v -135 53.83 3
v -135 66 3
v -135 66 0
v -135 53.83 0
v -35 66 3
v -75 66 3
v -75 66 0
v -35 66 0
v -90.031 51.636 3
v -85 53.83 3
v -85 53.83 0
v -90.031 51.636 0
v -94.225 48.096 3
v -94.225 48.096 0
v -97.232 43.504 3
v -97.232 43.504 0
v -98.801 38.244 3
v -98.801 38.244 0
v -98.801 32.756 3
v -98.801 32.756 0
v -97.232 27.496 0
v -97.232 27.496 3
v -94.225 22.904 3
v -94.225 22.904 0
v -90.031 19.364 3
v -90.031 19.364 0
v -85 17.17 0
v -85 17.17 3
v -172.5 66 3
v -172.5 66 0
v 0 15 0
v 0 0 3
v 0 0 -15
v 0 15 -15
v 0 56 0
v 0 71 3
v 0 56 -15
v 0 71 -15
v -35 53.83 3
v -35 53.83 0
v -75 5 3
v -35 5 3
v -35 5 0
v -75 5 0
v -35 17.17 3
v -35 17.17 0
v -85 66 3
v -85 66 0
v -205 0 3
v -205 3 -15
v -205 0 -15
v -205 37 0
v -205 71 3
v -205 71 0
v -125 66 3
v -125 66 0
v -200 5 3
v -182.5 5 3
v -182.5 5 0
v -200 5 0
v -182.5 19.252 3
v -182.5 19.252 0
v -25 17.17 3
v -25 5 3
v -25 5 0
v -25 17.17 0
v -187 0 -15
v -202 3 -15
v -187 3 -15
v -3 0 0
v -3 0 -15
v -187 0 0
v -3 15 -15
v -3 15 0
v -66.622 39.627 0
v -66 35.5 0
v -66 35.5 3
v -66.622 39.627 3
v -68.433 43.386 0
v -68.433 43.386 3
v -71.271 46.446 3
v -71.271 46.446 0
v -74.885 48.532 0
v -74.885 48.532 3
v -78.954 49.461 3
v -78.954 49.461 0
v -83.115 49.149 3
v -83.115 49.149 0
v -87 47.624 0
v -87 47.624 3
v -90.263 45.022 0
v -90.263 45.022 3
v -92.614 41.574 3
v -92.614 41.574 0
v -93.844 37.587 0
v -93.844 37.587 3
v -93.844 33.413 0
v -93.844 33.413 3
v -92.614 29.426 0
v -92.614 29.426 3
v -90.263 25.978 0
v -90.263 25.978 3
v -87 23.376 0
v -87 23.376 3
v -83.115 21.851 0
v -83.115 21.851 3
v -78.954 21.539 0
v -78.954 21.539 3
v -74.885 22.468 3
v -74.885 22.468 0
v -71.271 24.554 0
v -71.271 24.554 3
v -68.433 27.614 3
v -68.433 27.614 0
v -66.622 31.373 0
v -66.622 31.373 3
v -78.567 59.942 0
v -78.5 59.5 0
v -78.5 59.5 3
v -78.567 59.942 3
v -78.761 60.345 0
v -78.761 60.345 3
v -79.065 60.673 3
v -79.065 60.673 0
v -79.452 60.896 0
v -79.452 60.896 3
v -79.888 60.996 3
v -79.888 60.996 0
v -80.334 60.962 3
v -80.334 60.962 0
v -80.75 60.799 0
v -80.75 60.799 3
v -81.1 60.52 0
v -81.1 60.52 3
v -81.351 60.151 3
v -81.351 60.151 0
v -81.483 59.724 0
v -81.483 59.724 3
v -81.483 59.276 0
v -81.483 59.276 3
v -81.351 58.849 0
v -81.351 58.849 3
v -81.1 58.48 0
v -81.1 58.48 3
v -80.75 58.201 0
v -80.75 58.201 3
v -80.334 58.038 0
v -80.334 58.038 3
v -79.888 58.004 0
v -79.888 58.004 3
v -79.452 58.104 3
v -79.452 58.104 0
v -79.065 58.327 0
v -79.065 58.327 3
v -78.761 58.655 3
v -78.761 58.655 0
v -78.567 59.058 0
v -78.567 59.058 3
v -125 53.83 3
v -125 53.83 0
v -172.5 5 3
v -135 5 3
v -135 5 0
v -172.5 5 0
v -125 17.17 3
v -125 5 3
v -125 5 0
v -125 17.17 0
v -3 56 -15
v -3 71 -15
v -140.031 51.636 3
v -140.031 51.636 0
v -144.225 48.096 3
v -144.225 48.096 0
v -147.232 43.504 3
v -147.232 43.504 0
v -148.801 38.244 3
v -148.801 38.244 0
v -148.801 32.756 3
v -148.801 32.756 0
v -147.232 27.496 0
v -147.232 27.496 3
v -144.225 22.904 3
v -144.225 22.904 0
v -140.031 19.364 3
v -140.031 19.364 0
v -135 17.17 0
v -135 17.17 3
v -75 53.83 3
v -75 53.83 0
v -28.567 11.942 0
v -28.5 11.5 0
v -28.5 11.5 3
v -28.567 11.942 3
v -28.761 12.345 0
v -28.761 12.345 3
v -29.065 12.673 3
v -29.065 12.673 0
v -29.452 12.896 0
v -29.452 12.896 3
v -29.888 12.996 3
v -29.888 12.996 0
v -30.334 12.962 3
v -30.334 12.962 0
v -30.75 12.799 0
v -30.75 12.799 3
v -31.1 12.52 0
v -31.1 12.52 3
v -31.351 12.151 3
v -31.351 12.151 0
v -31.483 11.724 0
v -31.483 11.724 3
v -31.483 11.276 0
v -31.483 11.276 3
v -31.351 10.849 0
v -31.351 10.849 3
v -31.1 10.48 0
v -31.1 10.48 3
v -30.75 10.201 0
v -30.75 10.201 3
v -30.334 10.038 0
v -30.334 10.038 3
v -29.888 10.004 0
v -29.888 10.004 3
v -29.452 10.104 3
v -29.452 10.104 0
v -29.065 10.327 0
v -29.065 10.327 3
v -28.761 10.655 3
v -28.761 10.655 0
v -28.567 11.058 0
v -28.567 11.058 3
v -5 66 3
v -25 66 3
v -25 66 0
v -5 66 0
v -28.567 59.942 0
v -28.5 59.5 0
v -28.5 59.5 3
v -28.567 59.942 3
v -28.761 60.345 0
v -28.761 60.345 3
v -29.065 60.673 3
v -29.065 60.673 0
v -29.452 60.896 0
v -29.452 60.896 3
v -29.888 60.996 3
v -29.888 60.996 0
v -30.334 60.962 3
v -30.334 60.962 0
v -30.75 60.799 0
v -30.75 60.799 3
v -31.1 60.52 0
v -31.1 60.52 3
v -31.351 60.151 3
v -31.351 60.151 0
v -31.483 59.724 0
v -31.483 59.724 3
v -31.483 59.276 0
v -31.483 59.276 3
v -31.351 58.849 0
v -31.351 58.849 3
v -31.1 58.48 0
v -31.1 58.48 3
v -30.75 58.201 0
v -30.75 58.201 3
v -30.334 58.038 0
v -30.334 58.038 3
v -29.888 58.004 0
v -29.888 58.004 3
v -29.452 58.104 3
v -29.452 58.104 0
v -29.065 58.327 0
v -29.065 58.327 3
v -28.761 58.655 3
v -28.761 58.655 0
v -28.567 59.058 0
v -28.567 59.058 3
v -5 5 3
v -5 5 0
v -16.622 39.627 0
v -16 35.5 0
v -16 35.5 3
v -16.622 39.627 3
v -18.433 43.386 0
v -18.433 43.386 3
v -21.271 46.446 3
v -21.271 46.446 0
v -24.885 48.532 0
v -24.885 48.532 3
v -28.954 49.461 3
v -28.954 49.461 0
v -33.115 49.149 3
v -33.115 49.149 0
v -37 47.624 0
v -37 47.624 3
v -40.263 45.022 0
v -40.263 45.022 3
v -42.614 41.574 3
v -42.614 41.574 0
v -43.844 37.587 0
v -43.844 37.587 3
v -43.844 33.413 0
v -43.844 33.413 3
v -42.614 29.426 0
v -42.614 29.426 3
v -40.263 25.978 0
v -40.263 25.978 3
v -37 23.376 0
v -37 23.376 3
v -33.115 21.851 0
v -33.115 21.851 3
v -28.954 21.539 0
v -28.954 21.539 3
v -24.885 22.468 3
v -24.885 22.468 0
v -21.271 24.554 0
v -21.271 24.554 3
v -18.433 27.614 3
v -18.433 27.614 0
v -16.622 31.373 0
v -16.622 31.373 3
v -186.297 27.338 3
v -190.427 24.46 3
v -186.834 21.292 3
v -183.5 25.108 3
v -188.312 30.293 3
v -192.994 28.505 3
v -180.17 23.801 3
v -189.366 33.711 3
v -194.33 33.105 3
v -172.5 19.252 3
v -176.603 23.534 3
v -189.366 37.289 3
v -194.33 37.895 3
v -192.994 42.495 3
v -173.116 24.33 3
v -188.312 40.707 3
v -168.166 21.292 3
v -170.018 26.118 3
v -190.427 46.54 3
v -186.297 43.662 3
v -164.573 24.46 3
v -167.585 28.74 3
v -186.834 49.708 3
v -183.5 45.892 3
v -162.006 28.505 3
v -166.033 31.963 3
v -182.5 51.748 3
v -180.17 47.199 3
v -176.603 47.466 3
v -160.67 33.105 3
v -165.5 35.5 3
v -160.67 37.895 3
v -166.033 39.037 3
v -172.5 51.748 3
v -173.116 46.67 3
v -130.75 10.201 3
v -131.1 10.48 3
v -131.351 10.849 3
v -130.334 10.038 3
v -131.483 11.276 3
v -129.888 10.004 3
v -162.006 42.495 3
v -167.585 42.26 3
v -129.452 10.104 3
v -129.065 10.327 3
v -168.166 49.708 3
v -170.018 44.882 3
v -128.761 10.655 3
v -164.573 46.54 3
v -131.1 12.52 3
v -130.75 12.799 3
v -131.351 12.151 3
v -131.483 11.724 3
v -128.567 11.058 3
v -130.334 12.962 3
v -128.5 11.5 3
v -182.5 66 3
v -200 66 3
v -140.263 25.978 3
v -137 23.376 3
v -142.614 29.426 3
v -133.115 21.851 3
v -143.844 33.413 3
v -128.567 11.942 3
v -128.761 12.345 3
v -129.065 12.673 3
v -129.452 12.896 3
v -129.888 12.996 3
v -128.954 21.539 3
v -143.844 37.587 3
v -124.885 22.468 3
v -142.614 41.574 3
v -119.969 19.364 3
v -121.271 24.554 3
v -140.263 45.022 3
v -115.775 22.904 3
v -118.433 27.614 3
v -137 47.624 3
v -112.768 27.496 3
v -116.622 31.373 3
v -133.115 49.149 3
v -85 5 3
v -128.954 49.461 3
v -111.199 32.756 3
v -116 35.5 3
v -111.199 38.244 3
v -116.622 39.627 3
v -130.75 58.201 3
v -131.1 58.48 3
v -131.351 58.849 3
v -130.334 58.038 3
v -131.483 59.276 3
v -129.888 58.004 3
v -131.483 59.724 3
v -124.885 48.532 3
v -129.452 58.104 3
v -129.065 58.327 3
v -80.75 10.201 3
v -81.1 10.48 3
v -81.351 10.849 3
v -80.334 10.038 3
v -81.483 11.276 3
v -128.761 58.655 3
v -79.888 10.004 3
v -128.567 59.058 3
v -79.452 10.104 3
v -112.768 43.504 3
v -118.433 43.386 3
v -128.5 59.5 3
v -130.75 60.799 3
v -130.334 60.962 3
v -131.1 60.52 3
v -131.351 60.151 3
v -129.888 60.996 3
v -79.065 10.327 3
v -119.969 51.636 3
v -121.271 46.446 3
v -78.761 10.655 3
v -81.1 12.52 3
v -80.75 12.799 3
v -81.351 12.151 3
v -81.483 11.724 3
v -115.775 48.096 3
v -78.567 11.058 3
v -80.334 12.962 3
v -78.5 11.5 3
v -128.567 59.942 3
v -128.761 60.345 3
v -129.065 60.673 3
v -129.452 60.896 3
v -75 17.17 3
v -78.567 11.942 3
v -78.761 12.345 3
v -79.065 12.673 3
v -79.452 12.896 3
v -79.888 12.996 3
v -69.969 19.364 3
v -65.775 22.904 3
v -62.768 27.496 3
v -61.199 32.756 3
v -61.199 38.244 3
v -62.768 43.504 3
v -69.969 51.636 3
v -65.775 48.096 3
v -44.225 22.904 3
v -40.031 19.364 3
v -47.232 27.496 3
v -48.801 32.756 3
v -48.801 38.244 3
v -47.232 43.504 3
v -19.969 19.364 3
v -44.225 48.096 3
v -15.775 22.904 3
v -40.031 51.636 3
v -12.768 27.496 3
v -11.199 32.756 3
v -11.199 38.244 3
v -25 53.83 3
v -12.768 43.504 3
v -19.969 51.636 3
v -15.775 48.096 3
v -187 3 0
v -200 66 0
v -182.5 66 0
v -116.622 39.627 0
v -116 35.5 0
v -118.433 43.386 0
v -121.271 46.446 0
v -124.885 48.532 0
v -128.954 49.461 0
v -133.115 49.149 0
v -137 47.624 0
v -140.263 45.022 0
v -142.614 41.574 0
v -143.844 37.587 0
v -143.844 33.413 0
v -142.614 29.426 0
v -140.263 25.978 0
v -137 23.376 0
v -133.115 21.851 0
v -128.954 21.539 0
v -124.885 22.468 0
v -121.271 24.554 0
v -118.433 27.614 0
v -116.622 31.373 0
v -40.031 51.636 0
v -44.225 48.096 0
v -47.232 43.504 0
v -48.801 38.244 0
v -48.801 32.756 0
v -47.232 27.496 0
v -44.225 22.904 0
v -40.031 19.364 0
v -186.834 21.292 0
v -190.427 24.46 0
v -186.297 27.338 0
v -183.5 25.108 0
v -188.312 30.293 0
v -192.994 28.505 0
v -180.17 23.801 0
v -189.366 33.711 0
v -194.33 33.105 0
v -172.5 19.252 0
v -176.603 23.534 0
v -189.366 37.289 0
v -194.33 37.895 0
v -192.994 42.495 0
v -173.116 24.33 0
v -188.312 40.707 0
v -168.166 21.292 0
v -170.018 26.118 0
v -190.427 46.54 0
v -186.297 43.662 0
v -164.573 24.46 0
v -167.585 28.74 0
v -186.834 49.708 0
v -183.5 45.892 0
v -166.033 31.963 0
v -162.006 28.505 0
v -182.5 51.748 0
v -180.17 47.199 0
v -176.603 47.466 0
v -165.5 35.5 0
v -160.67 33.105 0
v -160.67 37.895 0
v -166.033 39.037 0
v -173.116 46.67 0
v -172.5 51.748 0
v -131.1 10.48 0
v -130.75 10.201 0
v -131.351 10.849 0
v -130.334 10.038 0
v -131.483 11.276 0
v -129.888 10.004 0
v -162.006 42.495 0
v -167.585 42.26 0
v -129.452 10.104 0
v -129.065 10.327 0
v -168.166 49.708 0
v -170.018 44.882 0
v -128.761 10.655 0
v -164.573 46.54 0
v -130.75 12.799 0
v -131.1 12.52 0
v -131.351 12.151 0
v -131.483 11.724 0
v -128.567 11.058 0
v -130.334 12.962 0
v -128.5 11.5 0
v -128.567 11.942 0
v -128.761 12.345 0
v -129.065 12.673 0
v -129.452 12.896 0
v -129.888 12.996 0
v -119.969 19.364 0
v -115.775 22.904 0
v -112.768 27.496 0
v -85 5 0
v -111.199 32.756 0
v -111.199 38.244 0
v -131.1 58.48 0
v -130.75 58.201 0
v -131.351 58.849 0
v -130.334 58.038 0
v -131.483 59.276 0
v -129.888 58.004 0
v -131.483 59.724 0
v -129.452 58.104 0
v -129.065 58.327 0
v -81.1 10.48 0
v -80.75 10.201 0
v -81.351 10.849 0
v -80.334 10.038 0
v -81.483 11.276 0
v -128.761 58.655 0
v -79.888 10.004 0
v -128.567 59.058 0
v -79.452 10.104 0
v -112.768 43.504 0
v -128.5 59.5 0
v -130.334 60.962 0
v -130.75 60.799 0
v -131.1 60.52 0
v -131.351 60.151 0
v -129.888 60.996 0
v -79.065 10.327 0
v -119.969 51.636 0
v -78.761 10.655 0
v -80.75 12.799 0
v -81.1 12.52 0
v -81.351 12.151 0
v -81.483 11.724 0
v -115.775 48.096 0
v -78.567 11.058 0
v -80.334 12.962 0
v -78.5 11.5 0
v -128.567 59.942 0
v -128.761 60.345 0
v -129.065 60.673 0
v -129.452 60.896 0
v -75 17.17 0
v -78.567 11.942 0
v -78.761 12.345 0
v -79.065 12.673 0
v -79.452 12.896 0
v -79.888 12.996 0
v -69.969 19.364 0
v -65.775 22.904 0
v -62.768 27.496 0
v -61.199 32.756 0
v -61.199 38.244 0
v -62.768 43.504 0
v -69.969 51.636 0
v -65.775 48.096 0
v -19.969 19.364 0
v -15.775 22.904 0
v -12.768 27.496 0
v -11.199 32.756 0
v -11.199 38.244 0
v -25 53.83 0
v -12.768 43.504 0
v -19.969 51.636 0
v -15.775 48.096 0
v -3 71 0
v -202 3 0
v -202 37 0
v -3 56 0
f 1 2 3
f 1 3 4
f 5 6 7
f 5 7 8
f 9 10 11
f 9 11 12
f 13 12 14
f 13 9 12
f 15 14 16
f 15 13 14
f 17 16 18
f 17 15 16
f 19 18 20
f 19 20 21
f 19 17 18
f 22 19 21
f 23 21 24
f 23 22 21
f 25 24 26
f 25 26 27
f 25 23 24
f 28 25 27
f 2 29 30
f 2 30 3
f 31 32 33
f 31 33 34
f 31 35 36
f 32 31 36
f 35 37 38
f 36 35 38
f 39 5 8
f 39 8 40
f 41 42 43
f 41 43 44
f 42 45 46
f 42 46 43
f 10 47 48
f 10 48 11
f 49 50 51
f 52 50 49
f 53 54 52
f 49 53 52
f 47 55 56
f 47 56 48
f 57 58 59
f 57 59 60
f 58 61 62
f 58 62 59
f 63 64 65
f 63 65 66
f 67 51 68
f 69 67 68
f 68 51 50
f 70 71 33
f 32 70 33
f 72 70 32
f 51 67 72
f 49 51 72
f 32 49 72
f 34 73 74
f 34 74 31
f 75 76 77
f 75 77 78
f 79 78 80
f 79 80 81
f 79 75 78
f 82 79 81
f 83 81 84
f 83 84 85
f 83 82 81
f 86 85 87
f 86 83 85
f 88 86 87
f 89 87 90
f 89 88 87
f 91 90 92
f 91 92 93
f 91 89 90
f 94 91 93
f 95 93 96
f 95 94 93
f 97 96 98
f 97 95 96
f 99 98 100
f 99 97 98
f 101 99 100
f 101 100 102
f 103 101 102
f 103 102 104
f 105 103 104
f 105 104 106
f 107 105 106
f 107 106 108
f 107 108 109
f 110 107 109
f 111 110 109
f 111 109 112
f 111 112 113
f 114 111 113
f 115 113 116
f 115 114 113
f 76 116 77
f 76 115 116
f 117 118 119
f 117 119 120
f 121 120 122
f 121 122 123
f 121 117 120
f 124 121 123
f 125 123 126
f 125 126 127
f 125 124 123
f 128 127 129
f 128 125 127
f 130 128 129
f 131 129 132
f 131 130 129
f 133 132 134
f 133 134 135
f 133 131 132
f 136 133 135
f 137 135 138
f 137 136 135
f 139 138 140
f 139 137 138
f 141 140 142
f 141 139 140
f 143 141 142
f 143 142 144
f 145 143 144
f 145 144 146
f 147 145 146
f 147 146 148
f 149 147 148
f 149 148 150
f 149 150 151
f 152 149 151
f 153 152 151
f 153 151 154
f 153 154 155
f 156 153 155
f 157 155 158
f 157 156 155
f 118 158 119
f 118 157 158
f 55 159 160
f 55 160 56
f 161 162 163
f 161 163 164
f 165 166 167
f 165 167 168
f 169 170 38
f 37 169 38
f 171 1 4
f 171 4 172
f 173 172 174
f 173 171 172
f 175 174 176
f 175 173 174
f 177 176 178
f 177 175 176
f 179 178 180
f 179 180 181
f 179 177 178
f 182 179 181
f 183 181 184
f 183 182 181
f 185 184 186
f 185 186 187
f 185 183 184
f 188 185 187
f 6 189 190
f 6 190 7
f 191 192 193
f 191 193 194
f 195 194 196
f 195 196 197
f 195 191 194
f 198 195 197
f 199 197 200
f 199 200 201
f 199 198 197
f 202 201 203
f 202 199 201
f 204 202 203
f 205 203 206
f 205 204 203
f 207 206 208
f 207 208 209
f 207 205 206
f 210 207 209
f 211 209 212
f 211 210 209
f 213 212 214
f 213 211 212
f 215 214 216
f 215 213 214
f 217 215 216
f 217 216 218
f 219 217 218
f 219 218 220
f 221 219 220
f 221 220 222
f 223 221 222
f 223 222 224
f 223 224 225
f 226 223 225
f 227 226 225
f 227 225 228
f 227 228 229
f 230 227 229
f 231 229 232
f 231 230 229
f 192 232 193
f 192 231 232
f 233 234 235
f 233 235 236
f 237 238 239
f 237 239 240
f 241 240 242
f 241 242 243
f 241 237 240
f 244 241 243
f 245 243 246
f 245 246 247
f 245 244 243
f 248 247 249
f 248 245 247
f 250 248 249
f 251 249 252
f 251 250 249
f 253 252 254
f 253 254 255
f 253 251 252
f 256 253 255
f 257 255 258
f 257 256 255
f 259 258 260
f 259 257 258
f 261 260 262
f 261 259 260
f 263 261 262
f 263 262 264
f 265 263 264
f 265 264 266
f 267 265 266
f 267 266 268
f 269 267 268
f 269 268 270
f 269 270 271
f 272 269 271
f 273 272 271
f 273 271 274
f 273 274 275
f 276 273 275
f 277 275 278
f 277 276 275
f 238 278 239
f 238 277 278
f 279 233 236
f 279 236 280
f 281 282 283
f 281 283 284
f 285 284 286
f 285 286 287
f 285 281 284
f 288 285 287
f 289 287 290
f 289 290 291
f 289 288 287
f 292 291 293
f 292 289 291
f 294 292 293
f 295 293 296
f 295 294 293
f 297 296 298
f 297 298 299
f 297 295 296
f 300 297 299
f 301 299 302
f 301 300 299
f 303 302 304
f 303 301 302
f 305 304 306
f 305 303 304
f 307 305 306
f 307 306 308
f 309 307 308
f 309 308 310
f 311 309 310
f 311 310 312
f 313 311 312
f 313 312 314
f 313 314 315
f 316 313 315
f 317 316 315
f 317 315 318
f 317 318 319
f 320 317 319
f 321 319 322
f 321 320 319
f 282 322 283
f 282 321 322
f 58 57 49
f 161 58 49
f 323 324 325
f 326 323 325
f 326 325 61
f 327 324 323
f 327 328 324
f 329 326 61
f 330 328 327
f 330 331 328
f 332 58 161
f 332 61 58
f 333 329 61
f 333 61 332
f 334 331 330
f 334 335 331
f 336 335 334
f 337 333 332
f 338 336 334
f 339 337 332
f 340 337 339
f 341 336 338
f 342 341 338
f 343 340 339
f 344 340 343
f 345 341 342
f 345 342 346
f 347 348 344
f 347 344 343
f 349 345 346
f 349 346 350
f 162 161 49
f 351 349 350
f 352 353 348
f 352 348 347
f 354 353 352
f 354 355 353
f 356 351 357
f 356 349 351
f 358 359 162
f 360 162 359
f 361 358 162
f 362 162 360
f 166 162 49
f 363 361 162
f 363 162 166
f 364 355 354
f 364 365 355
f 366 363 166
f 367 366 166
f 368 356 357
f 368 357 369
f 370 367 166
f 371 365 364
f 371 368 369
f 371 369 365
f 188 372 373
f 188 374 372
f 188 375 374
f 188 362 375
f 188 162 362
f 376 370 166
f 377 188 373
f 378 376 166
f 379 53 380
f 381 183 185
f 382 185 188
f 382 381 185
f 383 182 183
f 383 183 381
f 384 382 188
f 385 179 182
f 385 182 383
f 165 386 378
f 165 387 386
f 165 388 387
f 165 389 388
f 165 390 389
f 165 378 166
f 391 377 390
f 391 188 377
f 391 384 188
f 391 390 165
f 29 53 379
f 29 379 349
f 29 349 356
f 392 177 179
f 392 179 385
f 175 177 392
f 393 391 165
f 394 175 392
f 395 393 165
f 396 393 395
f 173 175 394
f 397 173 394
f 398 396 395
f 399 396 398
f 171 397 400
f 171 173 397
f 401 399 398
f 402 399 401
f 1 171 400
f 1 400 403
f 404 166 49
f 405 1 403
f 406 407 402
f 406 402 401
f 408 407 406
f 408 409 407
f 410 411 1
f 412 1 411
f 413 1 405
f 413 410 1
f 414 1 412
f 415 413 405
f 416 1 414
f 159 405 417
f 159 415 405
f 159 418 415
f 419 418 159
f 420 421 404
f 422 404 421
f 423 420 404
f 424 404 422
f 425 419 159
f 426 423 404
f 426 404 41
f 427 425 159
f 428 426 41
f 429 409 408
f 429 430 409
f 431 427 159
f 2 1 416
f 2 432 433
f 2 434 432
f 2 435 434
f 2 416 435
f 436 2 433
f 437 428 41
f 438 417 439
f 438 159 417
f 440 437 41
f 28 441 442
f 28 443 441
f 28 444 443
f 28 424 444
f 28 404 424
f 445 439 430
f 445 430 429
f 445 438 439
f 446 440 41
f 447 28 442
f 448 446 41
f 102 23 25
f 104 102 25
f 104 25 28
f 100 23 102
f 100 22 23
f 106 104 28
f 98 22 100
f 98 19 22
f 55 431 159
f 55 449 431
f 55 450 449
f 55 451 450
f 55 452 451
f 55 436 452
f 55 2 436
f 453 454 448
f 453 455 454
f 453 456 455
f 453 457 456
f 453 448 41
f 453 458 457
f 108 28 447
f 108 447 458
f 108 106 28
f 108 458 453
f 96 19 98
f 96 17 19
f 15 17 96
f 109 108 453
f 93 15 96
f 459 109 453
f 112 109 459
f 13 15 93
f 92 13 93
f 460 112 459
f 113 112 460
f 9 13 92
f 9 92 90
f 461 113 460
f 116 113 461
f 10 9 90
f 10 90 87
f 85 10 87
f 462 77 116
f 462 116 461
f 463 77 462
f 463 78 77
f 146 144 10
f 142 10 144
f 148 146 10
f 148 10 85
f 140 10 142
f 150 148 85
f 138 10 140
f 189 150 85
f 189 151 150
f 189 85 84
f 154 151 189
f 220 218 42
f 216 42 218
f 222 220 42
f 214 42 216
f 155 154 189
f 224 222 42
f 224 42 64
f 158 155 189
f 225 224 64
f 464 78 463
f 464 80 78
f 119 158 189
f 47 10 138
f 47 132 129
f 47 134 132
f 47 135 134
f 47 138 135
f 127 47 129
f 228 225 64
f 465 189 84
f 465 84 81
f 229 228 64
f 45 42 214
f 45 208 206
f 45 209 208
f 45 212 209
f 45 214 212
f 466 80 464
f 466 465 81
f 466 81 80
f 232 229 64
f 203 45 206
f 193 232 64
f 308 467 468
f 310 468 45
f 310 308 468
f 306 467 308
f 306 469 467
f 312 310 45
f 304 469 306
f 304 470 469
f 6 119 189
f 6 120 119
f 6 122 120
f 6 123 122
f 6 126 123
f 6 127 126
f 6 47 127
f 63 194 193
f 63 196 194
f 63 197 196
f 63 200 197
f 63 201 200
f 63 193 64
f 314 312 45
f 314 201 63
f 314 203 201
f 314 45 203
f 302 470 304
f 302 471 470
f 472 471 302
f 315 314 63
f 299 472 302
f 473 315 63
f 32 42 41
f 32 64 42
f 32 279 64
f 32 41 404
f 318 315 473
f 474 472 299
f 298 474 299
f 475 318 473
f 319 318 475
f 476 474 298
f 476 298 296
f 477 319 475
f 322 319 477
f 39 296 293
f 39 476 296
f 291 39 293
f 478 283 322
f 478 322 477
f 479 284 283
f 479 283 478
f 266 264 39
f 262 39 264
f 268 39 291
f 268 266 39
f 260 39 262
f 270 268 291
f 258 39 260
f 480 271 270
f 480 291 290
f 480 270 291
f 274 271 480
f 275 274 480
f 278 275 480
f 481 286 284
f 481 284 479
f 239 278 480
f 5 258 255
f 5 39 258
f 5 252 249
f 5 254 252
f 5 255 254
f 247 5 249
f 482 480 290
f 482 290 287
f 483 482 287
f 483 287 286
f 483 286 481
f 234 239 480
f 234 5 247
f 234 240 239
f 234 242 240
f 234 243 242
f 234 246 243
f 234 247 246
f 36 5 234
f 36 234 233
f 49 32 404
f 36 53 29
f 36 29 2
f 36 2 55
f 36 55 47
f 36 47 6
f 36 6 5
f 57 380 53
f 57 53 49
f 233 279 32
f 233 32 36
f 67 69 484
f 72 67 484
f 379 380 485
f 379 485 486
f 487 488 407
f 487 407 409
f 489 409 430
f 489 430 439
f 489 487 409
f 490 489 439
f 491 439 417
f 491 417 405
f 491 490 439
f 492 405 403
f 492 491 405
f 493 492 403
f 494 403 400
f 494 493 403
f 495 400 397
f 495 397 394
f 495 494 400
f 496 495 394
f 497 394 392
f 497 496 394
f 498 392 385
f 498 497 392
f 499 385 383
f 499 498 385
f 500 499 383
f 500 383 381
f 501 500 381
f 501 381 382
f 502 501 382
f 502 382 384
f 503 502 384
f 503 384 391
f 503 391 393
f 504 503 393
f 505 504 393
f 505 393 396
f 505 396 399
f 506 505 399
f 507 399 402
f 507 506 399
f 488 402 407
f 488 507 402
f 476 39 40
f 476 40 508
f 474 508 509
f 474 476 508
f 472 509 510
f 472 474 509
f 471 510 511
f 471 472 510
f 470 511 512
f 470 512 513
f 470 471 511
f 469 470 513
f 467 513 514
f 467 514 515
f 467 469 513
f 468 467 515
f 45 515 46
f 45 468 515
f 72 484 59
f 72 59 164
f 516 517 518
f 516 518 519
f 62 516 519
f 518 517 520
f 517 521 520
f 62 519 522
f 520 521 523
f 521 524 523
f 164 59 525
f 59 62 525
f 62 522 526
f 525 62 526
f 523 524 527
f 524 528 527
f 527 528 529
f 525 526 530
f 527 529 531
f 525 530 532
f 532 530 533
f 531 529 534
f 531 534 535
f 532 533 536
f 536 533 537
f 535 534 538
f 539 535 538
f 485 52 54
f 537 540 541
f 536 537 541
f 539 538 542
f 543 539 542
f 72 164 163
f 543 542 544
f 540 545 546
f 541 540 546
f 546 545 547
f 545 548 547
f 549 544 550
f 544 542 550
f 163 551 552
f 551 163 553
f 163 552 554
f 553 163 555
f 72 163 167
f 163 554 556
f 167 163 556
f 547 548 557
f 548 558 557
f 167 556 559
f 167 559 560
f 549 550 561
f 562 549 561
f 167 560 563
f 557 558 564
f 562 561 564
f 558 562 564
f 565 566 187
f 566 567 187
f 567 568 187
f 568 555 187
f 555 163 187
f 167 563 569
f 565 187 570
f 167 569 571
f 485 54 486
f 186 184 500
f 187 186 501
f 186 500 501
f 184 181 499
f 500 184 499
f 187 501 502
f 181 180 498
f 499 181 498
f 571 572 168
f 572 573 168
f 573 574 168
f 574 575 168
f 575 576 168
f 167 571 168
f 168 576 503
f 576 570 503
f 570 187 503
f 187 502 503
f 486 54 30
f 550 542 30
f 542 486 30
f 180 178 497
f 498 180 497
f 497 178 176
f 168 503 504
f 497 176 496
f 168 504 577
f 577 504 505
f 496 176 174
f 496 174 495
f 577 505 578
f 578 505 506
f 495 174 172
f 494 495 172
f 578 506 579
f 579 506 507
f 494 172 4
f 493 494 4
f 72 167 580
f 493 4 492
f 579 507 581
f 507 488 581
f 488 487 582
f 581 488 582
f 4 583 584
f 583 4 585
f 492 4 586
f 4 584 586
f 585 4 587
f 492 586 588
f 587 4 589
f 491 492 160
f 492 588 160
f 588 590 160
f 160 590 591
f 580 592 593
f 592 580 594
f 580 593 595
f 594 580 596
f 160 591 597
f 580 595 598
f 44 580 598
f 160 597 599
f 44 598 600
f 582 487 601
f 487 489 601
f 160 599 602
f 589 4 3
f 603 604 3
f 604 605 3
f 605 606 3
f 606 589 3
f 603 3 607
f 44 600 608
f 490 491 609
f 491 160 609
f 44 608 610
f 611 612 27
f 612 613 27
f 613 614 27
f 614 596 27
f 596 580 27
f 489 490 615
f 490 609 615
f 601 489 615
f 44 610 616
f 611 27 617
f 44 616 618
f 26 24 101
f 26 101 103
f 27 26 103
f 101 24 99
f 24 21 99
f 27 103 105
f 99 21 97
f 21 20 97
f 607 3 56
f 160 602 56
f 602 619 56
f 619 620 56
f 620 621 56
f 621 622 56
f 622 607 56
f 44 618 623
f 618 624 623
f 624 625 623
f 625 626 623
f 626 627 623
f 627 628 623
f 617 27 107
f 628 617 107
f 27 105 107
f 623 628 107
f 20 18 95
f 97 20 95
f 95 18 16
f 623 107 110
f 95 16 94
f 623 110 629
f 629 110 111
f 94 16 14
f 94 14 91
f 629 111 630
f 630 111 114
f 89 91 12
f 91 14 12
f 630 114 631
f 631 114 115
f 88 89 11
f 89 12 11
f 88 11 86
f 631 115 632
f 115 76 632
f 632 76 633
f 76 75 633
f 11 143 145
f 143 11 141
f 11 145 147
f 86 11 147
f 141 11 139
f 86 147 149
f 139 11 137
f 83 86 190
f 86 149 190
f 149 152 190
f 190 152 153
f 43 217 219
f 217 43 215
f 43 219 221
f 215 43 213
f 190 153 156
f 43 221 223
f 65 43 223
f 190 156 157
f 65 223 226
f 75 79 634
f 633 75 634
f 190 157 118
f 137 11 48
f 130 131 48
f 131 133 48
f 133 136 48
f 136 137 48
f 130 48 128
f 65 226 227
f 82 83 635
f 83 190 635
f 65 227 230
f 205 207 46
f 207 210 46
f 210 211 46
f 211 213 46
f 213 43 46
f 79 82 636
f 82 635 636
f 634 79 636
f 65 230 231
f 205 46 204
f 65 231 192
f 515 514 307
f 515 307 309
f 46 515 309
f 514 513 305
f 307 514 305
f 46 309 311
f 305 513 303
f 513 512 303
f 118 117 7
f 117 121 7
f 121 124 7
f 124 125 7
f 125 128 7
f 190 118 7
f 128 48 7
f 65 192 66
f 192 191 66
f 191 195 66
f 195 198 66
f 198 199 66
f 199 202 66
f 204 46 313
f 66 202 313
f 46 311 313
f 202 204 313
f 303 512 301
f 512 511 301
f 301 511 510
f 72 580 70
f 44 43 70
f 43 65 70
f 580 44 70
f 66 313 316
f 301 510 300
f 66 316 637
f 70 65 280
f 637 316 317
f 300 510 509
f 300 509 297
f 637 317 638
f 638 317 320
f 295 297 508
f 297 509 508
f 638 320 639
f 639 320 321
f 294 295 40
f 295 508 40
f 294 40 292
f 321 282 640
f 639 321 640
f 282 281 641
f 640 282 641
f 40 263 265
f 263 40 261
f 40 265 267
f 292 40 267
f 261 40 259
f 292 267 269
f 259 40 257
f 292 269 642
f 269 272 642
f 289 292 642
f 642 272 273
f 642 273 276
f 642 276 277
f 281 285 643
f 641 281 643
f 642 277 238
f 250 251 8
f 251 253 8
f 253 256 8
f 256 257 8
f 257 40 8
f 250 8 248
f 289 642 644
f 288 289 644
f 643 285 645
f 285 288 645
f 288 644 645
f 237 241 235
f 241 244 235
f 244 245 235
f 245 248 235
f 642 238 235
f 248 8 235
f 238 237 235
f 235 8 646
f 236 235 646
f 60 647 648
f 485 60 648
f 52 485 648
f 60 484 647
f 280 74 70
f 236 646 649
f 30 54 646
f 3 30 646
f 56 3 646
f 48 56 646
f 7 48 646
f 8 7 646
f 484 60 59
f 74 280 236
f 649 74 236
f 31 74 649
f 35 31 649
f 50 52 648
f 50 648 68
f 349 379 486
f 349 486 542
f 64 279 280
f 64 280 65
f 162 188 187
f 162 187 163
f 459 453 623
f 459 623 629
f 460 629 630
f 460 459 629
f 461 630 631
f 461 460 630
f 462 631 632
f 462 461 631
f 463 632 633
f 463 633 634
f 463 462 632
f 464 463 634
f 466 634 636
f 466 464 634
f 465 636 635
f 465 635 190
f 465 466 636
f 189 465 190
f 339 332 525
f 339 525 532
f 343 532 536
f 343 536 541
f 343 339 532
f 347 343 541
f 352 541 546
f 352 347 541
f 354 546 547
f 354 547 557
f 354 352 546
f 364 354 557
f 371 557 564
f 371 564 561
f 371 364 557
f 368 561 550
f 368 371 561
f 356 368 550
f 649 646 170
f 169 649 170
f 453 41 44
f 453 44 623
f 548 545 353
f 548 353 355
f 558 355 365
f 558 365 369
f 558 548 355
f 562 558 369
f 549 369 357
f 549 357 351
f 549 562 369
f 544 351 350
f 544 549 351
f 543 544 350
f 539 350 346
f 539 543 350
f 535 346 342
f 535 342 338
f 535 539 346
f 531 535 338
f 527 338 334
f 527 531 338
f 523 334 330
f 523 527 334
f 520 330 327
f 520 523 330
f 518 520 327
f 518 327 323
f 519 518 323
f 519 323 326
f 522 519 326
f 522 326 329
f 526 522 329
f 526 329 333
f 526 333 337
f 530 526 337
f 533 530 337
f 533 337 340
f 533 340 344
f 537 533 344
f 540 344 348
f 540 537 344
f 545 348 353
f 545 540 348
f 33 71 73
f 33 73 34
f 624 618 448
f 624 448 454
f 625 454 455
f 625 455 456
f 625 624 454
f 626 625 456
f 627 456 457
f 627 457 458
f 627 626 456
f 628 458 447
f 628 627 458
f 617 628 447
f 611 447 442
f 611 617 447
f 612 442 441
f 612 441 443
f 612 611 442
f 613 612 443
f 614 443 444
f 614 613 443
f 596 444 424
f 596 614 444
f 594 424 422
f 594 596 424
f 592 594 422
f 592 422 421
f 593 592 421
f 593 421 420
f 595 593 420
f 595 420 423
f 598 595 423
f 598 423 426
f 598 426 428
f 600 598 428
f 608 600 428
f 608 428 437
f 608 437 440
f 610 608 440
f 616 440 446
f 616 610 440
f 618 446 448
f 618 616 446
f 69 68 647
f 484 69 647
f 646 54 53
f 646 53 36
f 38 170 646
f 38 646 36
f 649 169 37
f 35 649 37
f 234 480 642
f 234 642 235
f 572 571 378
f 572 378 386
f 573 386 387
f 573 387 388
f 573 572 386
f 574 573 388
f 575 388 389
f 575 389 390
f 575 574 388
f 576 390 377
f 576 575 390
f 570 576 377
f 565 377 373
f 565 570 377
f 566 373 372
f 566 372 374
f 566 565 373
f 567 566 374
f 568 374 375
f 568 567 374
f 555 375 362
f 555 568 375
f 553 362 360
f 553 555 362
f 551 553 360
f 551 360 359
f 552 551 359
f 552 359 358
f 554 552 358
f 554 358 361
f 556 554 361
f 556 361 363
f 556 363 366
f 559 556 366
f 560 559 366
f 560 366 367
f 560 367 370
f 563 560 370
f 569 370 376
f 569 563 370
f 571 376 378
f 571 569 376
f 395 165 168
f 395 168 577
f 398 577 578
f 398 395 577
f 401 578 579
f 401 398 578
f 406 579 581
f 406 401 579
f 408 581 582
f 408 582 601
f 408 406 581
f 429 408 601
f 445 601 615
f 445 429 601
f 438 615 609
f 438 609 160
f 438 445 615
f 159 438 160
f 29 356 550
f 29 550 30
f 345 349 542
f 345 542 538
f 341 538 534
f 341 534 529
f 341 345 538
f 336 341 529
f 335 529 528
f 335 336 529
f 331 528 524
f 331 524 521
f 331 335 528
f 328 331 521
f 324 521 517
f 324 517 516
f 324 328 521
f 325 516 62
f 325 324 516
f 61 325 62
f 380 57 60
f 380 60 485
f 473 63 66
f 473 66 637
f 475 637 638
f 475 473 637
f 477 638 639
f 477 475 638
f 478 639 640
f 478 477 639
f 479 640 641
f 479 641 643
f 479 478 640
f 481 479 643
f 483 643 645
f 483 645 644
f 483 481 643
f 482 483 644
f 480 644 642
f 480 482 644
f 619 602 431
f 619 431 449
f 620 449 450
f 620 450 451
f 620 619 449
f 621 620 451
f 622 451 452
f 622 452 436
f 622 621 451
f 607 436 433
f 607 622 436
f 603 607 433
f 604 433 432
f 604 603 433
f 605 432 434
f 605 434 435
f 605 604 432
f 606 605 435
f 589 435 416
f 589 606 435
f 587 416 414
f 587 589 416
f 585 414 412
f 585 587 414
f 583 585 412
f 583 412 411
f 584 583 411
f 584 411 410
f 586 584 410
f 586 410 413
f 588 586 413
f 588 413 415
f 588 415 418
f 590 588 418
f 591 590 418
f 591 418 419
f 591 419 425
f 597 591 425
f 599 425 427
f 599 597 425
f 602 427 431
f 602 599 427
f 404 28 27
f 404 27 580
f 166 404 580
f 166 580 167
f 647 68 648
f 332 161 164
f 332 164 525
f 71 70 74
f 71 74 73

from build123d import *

# Parameters (mm, degrees)
SKETCH1_W           = 205
SKETCH1_H           = 71
SKETCH1_R           = 14
SKETCH1_R_2         = 12
SKETCH1_R_3         = 1.5
BOSS_EXTRUDE1_DEPTH = 3
SKETCH2_W           = 3
SKETCH2_H           = 15
BOSS_EXTRUDE2_DEPTH = 15
BOSS_EXTRUDE3_START = -71
SKETCH2_2_W         = 3
SKETCH2_2_H         = 15
BOSS_EXTRUDE3_DEPTH = 15
SKETCH4_W           = 15
SKETCH4_H           = 3
BOSS_EXTRUDE4_DEPTH = 18
BOSS_EXTRUDE5_DEPTH = 3
CUT_EXTRUDE1_REACH  = 219.692


with BuildPart() as part:
    # Sketch1 → Boss-Extrude1 (new body)
    with BuildSketch(Plane.XY):
        with Locations((-102.5, 35.5)):
            Rectangle(SKETCH1_W, SKETCH1_H)
        with Locations((-30, 35.5)):
            Circle(SKETCH1_R, mode=Mode.SUBTRACT)
        with Locations((-80, 35.5)):
            Circle(SKETCH1_R, mode=Mode.SUBTRACT)
        with Locations((-130, 35.5)):
            Circle(SKETCH1_R, mode=Mode.SUBTRACT)
        with Locations((-177.5, 35.5)):
            Circle(SKETCH1_R_2, mode=Mode.SUBTRACT)
        with Locations((-30, 59.5)):
            Circle(SKETCH1_R_3, mode=Mode.SUBTRACT)
        with Locations((-30, 11.5)):
            Circle(SKETCH1_R_3, mode=Mode.SUBTRACT)
        with Locations((-80, 59.5)):
            Circle(SKETCH1_R_3, mode=Mode.SUBTRACT)
        with Locations((-80, 11.5)):
            Circle(SKETCH1_R_3, mode=Mode.SUBTRACT)
        with Locations((-130, 59.5)):
            Circle(SKETCH1_R_3, mode=Mode.SUBTRACT)
        with Locations((-130, 11.5)):
            Circle(SKETCH1_R_3, mode=Mode.SUBTRACT)
    extrude(amount=BOSS_EXTRUDE1_DEPTH)

    # Sketch2 → Boss-Extrude2 (add)
    with BuildSketch(Plane(origin=(0, 71, 0), x_dir=(1, 0, 0), z_dir=(0, 1, 0))):
        with Locations((-1.5, 7.5)):
            Rectangle(SKETCH2_W, SKETCH2_H)
    extrude(amount=-BOSS_EXTRUDE2_DEPTH)

    # Sketch2<2> → Boss-Extrude3 (add)
    with BuildSketch(Plane(origin=(0, 71, 0), x_dir=(1, 0, 0), z_dir=(0, 1, 0)).offset(BOSS_EXTRUDE3_START)):
        with Locations((-1.5, 7.5)):
            Rectangle(SKETCH2_2_W, SKETCH2_2_H)
    extrude(amount=BOSS_EXTRUDE3_DEPTH)

    # Sketch4 → Boss-Extrude4 (add)
    with BuildSketch(Plane.ZY.offset(205)):
        with Locations((-7.5, 1.5)):
            Rectangle(SKETCH4_W, SKETCH4_H)
    extrude(amount=-BOSS_EXTRUDE4_DEPTH)

    # Sketch5 → Boss-Extrude5 (add)
    with BuildSketch(Plane.ZY.offset(205)):
        Polygon((0, 37), (-15, 3), (0, 3), align=None)
    extrude(amount=-BOSS_EXTRUDE5_DEPTH)

    # Sketch6 → Cut-Extrude1 (cut, up to next)
    with BuildSketch(Plane.XY.offset(3), mode=Mode.PRIVATE) as cut_extrude1_sk1:
        with BuildLine():
            ThreePointArc((-182.5, 51.748076809), (-194.5, 35.5), (-182.5, 19.251923191))
            Line((-182.5, 19.251923191), (-182.5, 5))
            Line((-182.5, 5), (-200, 5))
            Line((-200, 5), (-200, 66))
            Line((-200, 66), (-182.5, 66))
            Line((-182.5, 66), (-182.5, 51.748076809))
        make_face()
    cut_extrude1_tool1 = extrude(cut_extrude1_sk1.sketch, amount=-CUT_EXTRUDE1_REACH, mode=Mode.PRIVATE) & part.part
    # Sketch6 → Cut-Extrude1 (cut, up to next)
    with BuildSketch(Plane.XY.offset(3), mode=Mode.PRIVATE) as cut_extrude1_sk2:
        with BuildLine():
            ThreePointArc((-135, 53.83030278), (-149, 35.5), (-135, 17.16969722))
            Line((-135, 17.16969722), (-135, 5))
            Line((-135, 5), (-172.5, 5))
            Line((-172.5, 5), (-172.5, 19.251923191))
            ThreePointArc((-172.5, 19.251923191), (-160.5, 35.5), (-172.5, 51.748076809))
            Line((-172.5, 51.748076809), (-172.5, 66))
            Line((-172.5, 66), (-135, 66))
            Line((-135, 66), (-135, 53.83030278))
        make_face()
    cut_extrude1_tool2 = extrude(cut_extrude1_sk2.sketch, amount=-CUT_EXTRUDE1_REACH, mode=Mode.PRIVATE) & part.part
    # Sketch6 → Cut-Extrude1 (cut, up to next)
    with BuildSketch(Plane.XY.offset(3), mode=Mode.PRIVATE) as cut_extrude1_sk3:
        with BuildLine():
            ThreePointArc((-125, 17.16969722), (-111, 35.5), (-125, 53.83030278))
            Line((-125, 53.83030278), (-125, 66))
            Line((-125, 66), (-85, 66))
            Line((-85, 66), (-85, 53.83030278))
            ThreePointArc((-85, 53.83030278), (-99, 35.5), (-85, 17.16969722))
            Line((-85, 17.16969722), (-85, 5))
            Line((-85, 5), (-125, 5))
            Line((-125, 5), (-125, 17.16969722))
        make_face()
    cut_extrude1_tool3 = extrude(cut_extrude1_sk3.sketch, amount=-CUT_EXTRUDE1_REACH, mode=Mode.PRIVATE) & part.part
    # Sketch6 → Cut-Extrude1 (cut, up to next)
    with BuildSketch(Plane.XY.offset(3), mode=Mode.PRIVATE) as cut_extrude1_sk4:
        with BuildLine():
            ThreePointArc((-75, 17.16969722), (-61, 35.5), (-75, 53.83030278))
            Line((-75, 53.83030278), (-75, 66))
            Line((-75, 66), (-35, 66))
            Line((-35, 66), (-35, 53.83030278))
            ThreePointArc((-35, 53.83030278), (-49, 35.5), (-35, 17.16969722))
            Line((-35, 17.16969722), (-35, 5))
            Line((-35, 5), (-75, 5))
            Line((-75, 5), (-75, 17.16969722))
        make_face()
    cut_extrude1_tool4 = extrude(cut_extrude1_sk4.sketch, amount=-CUT_EXTRUDE1_REACH, mode=Mode.PRIVATE) & part.part
    # Sketch6 → Cut-Extrude1 (cut, up to next)
    with BuildSketch(Plane.XY.offset(3), mode=Mode.PRIVATE) as cut_extrude1_sk5:
        with BuildLine():
            ThreePointArc((-25, 17.16969722), (-11, 35.5), (-25, 53.83030278))
            Line((-25, 53.83030278), (-25, 66))
            Line((-25, 66), (-5, 66))
            Line((-5, 66), (-5, 5))
            Line((-5, 5), (-25, 5))
            Line((-25, 5), (-25, 17.16969722))
        make_face()
    cut_extrude1_tool5 = extrude(cut_extrude1_sk5.sketch, amount=-CUT_EXTRUDE1_REACH, mode=Mode.PRIVATE) & part.part
    add(cut_extrude1_tool1.solids().sort_by_distance((-195.134606, 35.5, 3))[0], mode=Mode.SUBTRACT)
    add(cut_extrude1_tool2.solids().sort_by_distance((-154.340944, 35.5, 3))[0], mode=Mode.SUBTRACT)
    add(cut_extrude1_tool3.solids().sort_by_distance((-105, 35.5, 3))[0], mode=Mode.SUBTRACT)
    add(cut_extrude1_tool4.solids().sort_by_distance((-55, 35.5, 3))[0], mode=Mode.SUBTRACT)
    add(cut_extrude1_tool5.solids().sort_by_distance((-10.35805, 35.5, 3))[0], mode=Mode.SUBTRACT)


solid = part.part
